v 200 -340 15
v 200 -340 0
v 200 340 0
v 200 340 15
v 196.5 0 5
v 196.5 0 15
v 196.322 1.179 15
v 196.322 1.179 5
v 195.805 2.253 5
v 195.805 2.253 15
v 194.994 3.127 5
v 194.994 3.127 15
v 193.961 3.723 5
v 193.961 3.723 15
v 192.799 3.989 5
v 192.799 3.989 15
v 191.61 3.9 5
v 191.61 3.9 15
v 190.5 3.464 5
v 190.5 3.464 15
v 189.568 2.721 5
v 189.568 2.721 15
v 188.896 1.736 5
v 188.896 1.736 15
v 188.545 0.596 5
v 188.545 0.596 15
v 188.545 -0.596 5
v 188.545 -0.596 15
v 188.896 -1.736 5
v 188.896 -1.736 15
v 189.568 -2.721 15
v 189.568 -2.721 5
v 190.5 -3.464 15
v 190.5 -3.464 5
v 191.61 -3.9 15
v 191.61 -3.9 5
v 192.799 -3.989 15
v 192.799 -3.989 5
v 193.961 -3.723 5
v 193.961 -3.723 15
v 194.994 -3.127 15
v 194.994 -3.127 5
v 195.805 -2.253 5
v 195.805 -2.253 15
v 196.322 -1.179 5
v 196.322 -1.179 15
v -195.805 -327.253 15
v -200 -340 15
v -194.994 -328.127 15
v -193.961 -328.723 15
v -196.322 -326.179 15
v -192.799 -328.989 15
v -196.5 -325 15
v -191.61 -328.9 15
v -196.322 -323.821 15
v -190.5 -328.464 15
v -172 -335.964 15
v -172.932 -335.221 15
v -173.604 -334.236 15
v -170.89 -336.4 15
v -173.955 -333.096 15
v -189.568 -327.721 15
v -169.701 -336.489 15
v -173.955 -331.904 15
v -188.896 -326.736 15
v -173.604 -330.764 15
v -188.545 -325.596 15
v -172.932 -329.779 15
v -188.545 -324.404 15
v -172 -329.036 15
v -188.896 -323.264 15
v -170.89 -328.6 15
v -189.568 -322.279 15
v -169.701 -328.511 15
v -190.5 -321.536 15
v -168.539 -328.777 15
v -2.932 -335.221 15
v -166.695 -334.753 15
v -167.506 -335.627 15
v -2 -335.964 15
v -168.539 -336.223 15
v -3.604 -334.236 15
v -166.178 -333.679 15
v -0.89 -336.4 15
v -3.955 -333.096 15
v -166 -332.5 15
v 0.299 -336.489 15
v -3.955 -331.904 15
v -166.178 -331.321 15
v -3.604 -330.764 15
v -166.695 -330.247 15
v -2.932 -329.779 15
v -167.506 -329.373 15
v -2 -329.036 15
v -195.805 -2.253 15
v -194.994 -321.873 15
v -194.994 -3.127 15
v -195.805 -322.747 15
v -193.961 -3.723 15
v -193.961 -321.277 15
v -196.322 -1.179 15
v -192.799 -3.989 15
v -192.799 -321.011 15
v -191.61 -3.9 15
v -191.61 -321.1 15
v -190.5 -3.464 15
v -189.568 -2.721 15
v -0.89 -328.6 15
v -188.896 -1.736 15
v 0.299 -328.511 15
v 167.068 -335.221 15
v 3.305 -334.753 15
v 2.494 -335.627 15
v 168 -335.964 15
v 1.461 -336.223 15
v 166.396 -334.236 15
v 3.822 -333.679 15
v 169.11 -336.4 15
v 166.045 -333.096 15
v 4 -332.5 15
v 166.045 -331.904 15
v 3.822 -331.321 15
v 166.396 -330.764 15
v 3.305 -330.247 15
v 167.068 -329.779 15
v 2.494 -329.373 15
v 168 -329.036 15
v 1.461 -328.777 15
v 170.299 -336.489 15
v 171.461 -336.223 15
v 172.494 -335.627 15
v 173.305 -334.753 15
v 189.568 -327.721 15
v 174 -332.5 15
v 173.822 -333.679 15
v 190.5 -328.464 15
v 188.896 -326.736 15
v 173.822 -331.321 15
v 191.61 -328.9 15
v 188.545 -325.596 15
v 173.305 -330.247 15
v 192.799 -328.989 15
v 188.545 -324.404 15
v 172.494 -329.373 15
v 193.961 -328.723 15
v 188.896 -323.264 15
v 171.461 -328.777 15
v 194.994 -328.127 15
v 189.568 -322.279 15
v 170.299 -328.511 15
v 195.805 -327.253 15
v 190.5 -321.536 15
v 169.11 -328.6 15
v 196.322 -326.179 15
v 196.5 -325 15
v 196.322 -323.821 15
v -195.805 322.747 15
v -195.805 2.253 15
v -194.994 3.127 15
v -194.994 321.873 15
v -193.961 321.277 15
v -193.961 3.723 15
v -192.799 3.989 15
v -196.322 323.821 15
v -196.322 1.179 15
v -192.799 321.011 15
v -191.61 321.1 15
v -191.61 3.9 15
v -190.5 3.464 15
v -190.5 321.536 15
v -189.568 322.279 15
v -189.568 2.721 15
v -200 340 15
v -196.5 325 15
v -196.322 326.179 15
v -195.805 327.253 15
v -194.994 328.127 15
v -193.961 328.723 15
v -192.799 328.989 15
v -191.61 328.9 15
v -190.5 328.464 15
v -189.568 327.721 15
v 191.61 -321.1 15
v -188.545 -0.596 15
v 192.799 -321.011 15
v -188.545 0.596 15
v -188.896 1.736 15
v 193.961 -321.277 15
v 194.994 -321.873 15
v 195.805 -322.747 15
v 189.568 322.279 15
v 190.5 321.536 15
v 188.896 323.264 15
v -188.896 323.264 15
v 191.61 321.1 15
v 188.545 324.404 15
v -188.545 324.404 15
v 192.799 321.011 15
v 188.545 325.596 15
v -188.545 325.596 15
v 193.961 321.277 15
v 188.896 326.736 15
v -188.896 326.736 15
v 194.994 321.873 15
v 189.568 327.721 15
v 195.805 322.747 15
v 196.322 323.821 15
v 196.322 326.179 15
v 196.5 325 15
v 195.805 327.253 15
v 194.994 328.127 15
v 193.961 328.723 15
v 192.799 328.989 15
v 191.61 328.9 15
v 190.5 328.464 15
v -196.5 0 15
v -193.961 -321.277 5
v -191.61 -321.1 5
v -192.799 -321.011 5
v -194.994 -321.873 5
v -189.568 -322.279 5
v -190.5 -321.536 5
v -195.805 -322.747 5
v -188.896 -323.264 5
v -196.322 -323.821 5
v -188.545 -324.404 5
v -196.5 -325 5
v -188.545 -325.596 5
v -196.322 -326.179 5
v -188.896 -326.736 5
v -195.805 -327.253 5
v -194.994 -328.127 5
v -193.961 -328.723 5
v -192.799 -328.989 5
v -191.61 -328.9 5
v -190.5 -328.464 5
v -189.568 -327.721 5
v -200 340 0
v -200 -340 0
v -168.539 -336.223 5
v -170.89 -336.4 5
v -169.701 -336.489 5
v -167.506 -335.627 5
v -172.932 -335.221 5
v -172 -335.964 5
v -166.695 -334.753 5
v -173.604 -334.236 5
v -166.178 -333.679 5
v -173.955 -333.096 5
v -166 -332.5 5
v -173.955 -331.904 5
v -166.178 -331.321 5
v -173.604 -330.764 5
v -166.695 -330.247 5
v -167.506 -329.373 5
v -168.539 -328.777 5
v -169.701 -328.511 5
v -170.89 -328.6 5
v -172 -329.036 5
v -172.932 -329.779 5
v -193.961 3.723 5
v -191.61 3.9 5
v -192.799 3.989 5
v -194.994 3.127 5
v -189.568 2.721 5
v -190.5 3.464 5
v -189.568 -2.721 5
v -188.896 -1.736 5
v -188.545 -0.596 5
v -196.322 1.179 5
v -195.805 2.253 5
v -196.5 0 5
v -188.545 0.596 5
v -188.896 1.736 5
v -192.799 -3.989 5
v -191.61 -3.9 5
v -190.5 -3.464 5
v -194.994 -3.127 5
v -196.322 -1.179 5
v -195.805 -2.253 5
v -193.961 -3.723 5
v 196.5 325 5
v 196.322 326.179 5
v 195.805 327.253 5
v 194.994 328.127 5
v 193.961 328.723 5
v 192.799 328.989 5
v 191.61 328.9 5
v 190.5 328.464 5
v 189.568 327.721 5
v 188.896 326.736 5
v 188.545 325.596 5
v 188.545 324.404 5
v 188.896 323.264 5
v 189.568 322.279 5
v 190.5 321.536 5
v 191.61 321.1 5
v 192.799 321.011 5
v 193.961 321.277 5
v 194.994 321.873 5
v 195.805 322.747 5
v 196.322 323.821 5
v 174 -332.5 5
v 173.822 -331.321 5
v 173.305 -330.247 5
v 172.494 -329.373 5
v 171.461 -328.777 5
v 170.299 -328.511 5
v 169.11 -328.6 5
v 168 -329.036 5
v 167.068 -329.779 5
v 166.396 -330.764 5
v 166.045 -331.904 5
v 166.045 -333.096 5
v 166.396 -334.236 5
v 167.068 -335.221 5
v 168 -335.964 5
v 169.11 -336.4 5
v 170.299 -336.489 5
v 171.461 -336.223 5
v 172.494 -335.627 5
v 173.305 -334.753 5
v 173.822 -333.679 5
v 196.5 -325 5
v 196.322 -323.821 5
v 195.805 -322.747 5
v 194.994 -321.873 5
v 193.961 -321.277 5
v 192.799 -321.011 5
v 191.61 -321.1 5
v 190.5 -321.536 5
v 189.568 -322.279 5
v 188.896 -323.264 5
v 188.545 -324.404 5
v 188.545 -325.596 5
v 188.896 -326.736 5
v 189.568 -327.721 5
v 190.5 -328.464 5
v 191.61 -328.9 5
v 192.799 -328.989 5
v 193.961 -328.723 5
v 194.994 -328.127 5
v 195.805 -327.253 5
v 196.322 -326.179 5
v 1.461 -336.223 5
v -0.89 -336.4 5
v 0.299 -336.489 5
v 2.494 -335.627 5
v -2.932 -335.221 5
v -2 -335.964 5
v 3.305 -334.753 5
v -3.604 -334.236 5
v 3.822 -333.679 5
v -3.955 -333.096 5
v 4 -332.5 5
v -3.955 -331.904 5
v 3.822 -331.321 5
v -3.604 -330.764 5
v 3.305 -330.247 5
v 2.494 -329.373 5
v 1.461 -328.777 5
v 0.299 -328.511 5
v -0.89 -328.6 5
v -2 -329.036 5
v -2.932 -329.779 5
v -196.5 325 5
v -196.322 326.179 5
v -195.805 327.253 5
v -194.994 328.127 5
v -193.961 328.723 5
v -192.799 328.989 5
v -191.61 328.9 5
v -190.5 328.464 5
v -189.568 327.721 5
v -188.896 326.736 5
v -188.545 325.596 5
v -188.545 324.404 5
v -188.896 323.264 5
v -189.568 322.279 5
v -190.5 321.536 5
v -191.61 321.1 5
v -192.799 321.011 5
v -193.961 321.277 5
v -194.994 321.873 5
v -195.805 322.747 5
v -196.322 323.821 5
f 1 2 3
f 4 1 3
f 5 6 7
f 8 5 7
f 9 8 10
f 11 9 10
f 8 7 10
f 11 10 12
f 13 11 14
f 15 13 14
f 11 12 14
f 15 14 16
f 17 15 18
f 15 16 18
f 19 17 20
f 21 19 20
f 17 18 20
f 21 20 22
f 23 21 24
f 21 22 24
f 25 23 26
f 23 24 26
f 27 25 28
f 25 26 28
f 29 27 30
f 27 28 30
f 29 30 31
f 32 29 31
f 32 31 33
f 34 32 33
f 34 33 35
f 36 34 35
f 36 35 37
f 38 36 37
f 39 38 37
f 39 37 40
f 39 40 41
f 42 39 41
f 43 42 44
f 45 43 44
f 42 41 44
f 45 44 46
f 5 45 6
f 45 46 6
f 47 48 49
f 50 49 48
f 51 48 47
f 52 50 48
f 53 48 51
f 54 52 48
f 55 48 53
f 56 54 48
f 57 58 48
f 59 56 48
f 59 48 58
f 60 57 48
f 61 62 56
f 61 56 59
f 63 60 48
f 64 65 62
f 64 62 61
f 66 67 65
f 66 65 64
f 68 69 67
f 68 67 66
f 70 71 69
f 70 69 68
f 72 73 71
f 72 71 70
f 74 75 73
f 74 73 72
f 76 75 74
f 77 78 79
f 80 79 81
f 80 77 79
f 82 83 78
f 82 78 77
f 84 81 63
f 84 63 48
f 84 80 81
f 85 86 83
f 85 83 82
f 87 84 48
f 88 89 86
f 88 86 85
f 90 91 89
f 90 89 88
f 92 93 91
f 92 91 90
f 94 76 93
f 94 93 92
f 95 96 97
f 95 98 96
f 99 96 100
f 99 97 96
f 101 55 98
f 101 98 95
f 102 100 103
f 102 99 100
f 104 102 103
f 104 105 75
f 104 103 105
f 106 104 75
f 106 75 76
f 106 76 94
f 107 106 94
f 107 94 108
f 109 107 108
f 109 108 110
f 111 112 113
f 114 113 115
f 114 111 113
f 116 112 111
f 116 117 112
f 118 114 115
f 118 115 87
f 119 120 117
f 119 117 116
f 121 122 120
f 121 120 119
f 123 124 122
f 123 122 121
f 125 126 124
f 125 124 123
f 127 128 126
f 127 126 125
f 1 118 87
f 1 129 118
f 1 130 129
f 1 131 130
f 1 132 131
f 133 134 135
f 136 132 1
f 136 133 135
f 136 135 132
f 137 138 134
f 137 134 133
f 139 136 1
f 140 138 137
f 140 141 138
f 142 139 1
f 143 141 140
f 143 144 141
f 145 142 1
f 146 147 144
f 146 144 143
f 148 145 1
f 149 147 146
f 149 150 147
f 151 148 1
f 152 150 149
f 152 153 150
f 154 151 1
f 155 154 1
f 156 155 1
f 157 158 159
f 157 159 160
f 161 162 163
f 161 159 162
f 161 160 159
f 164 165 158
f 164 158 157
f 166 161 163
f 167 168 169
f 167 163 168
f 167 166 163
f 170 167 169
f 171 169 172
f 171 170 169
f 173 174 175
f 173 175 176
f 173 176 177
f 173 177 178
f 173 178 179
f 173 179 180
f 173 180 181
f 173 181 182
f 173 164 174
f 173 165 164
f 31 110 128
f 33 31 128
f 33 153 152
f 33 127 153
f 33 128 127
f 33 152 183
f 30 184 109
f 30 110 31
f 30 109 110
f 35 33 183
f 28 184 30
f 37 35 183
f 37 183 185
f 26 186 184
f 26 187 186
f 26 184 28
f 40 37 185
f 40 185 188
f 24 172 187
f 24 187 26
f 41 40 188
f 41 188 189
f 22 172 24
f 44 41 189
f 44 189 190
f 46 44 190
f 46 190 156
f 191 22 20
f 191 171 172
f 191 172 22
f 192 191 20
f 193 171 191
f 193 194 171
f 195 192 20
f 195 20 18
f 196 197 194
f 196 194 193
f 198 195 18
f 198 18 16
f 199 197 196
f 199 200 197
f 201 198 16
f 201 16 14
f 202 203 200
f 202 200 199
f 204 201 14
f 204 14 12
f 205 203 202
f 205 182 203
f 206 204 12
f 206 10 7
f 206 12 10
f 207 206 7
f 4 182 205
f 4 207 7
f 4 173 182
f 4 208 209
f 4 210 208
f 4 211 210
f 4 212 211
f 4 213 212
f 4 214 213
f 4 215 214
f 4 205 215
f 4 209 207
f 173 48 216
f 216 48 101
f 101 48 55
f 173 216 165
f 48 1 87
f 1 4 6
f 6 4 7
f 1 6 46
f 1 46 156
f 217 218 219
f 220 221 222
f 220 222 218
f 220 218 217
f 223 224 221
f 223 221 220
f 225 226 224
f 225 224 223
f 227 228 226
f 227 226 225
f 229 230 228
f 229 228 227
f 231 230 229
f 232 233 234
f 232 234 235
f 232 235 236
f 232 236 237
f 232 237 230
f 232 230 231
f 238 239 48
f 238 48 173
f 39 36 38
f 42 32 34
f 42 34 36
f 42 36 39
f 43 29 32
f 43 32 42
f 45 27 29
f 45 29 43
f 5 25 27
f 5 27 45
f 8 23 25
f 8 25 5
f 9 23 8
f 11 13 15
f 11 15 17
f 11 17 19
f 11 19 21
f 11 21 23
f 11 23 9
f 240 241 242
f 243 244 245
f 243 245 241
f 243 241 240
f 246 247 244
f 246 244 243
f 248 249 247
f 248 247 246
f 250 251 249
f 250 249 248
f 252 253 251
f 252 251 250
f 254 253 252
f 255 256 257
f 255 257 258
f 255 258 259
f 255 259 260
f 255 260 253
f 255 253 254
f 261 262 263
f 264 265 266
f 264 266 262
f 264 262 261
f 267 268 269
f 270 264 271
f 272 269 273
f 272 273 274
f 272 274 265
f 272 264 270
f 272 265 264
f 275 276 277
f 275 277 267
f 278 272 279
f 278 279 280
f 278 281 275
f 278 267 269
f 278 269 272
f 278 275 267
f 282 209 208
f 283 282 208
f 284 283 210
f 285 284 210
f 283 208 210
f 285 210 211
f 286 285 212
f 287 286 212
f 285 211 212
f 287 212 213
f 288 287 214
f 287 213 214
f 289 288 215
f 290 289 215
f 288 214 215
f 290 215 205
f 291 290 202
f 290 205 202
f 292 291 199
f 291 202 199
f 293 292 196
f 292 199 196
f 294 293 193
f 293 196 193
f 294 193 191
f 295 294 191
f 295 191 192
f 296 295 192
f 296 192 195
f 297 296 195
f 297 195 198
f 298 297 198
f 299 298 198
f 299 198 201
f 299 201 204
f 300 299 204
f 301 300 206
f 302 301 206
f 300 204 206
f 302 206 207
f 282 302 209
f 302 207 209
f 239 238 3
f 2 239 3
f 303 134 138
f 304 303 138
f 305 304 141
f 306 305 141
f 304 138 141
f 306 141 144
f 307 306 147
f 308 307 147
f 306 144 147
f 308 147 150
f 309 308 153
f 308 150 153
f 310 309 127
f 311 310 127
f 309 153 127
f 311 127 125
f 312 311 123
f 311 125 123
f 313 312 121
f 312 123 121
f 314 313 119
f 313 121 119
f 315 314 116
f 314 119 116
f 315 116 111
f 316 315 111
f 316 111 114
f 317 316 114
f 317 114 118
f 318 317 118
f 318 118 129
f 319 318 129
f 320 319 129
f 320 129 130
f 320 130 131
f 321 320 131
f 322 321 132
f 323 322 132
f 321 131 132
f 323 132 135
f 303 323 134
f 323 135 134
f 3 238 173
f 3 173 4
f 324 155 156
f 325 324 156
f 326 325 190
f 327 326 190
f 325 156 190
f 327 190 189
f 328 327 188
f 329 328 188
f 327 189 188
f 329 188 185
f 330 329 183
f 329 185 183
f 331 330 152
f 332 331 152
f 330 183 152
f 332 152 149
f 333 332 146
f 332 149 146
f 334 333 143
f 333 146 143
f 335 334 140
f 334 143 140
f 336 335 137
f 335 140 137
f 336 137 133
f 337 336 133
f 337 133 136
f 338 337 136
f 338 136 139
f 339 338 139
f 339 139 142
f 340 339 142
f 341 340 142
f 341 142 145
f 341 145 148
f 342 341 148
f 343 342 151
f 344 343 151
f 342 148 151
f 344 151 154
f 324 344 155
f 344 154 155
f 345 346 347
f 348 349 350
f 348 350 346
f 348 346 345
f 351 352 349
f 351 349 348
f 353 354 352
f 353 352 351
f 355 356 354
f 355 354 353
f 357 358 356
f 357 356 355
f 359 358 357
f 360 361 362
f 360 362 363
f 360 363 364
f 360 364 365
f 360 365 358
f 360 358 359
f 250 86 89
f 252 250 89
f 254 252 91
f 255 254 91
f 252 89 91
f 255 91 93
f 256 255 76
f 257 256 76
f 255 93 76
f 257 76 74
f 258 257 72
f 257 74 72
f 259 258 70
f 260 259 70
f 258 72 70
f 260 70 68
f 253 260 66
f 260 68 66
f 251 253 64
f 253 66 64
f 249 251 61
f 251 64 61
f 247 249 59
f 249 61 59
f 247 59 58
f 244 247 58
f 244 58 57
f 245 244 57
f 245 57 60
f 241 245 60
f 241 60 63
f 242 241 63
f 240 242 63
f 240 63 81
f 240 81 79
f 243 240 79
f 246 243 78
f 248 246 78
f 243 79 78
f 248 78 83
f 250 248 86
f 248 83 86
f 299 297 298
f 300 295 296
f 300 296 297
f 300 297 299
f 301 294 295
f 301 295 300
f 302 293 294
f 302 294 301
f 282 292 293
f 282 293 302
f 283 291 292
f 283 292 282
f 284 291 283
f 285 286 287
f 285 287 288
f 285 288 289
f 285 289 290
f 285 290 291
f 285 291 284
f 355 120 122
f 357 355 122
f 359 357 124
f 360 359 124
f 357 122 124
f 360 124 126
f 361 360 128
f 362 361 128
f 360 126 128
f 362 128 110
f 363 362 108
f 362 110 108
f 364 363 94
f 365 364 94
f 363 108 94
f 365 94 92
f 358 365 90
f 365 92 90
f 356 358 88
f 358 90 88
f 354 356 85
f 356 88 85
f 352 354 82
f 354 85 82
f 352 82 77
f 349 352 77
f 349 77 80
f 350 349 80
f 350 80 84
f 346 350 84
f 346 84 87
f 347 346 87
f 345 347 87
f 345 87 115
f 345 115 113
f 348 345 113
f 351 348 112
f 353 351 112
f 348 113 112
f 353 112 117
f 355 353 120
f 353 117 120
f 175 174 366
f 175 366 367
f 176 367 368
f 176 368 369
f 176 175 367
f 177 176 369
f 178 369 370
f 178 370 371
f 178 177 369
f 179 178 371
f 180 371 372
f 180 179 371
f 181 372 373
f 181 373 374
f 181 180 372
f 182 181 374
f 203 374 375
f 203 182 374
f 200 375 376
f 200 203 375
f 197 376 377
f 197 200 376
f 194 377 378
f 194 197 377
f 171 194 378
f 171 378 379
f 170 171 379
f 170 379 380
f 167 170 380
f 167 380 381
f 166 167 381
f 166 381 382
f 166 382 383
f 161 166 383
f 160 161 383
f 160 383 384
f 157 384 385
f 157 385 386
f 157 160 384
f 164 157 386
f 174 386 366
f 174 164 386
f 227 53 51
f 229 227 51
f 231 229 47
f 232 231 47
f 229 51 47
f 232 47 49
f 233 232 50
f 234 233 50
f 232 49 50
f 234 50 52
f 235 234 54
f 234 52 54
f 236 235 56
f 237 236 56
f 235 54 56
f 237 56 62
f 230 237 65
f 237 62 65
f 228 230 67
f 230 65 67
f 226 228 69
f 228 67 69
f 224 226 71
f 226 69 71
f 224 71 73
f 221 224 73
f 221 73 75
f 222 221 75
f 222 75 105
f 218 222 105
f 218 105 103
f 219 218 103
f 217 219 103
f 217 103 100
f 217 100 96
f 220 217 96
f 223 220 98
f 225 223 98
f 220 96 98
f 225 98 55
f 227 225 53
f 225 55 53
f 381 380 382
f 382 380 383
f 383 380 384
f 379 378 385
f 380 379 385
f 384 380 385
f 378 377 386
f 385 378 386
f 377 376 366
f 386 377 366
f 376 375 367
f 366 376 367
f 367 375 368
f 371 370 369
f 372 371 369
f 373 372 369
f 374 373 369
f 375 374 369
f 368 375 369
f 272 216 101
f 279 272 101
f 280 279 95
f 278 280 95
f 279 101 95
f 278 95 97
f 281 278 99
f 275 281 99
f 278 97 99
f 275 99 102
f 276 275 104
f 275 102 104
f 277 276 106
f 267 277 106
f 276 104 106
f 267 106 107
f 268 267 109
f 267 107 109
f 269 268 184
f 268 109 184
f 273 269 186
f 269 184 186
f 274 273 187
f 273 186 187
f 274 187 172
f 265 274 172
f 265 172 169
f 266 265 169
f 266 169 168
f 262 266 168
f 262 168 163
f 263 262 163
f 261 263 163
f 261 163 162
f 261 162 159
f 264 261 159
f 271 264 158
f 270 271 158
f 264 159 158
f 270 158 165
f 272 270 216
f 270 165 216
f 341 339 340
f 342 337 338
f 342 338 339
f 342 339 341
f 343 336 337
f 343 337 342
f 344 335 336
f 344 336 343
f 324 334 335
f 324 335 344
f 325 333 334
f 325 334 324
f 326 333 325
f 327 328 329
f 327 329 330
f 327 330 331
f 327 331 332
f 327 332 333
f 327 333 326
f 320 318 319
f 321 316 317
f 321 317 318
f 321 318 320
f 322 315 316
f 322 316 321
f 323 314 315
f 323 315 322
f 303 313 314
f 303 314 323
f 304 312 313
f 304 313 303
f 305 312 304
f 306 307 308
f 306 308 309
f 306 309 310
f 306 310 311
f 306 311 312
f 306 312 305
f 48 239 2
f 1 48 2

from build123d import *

# Parameters (mm, degrees)
SKETCH1_W               = 400
SKETCH1_H               = 680
BOSS_EXTRUDE1_DEPTH     = 15
SKETCH2_R               = 4
CUT_EXTRUDE1_DEPTH      = 10
LPATTERN1_COUNT         = 3
LPATTERN1_PITCH         = 325
MIRROR1_COPY_1_SKETCH_R = 4
MIRROR1_COPY_1_DEPTH    = 10
MIRROR1_COPY_2_SKETCH_R = 4
MIRROR1_COPY_2_DEPTH    = 10
SKETCH2_3_R             = 4
CUT_EXTRUDE2_DEPTH      = 10
LPATTERN2_COUNT         = 3
LPATTERN2_PITCH         = 170


with BuildPart() as part:
    # Sketch1 → Boss-Extrude1 (new body)
    with BuildSketch(Plane.XY):
        Rectangle(SKETCH1_W, SKETCH1_H)
    extrude(amount=BOSS_EXTRUDE1_DEPTH)

    # Sketch2 → Cut-Extrude1 (cut)
    with BuildSketch(Plane.XY.offset(15)):
        with Locations((192.5, 325)):
            Circle(SKETCH2_R)
    cut_extrude1 = extrude(amount=-CUT_EXTRUDE1_DEPTH, mode=Mode.SUBTRACT)

    # LPattern1: Cut-Extrude1 ×3
    with Locations(*[(0, -i * LPATTERN1_PITCH, 0) for i in range(1, LPATTERN1_COUNT)]):
        add(cut_extrude1, mode=Mode.SUBTRACT)

    # Mirror1: Cut-Extrude1 across plane
    add(cut_extrude1.mirror(Plane(origin=(0, 0, 0), x_dir=(0, 0, 1), z_dir=(1, 0, 0))), mode=Mode.SUBTRACT)

    # Mirror1 copy 1 sketch → Mirror1 copy 1 (cut)
    with BuildSketch(Plane(origin=(0, -325, 15), x_dir=(-1, 0, 0), z_dir=(0, 0, 1))):
        with Locations((192.5, -325)):
            Circle(MIRROR1_COPY_1_SKETCH_R)
    extrude(amount=-MIRROR1_COPY_1_DEPTH, mode=Mode.SUBTRACT)

    # Mirror1 copy 2 sketch → Mirror1 copy 2 (cut)
    with BuildSketch(Plane(origin=(0, -650, 15), x_dir=(-1, 0, 0), z_dir=(0, 0, 1))):
        with Locations((192.5, -325)):
            Circle(MIRROR1_COPY_2_SKETCH_R)
    extrude(amount=-MIRROR1_COPY_2_DEPTH, mode=Mode.SUBTRACT)

    # Sketch2<3> → Cut-Extrude2 (cut)
    with BuildSketch(Plane.XY.offset(15)):
        with Locations((170, -332.5)):
            Circle(SKETCH2_3_R)
    cut_extrude2 = extrude(amount=-CUT_EXTRUDE2_DEPTH, mode=Mode.SUBTRACT)

    # LPattern2: Cut-Extrude2 ×3
    with Locations(*[(-i * LPATTERN2_PITCH, 0, 0) for i in range(1, LPATTERN2_COUNT)]):
        add(cut_extrude2, mode=Mode.SUBTRACT)


solid = part.part
